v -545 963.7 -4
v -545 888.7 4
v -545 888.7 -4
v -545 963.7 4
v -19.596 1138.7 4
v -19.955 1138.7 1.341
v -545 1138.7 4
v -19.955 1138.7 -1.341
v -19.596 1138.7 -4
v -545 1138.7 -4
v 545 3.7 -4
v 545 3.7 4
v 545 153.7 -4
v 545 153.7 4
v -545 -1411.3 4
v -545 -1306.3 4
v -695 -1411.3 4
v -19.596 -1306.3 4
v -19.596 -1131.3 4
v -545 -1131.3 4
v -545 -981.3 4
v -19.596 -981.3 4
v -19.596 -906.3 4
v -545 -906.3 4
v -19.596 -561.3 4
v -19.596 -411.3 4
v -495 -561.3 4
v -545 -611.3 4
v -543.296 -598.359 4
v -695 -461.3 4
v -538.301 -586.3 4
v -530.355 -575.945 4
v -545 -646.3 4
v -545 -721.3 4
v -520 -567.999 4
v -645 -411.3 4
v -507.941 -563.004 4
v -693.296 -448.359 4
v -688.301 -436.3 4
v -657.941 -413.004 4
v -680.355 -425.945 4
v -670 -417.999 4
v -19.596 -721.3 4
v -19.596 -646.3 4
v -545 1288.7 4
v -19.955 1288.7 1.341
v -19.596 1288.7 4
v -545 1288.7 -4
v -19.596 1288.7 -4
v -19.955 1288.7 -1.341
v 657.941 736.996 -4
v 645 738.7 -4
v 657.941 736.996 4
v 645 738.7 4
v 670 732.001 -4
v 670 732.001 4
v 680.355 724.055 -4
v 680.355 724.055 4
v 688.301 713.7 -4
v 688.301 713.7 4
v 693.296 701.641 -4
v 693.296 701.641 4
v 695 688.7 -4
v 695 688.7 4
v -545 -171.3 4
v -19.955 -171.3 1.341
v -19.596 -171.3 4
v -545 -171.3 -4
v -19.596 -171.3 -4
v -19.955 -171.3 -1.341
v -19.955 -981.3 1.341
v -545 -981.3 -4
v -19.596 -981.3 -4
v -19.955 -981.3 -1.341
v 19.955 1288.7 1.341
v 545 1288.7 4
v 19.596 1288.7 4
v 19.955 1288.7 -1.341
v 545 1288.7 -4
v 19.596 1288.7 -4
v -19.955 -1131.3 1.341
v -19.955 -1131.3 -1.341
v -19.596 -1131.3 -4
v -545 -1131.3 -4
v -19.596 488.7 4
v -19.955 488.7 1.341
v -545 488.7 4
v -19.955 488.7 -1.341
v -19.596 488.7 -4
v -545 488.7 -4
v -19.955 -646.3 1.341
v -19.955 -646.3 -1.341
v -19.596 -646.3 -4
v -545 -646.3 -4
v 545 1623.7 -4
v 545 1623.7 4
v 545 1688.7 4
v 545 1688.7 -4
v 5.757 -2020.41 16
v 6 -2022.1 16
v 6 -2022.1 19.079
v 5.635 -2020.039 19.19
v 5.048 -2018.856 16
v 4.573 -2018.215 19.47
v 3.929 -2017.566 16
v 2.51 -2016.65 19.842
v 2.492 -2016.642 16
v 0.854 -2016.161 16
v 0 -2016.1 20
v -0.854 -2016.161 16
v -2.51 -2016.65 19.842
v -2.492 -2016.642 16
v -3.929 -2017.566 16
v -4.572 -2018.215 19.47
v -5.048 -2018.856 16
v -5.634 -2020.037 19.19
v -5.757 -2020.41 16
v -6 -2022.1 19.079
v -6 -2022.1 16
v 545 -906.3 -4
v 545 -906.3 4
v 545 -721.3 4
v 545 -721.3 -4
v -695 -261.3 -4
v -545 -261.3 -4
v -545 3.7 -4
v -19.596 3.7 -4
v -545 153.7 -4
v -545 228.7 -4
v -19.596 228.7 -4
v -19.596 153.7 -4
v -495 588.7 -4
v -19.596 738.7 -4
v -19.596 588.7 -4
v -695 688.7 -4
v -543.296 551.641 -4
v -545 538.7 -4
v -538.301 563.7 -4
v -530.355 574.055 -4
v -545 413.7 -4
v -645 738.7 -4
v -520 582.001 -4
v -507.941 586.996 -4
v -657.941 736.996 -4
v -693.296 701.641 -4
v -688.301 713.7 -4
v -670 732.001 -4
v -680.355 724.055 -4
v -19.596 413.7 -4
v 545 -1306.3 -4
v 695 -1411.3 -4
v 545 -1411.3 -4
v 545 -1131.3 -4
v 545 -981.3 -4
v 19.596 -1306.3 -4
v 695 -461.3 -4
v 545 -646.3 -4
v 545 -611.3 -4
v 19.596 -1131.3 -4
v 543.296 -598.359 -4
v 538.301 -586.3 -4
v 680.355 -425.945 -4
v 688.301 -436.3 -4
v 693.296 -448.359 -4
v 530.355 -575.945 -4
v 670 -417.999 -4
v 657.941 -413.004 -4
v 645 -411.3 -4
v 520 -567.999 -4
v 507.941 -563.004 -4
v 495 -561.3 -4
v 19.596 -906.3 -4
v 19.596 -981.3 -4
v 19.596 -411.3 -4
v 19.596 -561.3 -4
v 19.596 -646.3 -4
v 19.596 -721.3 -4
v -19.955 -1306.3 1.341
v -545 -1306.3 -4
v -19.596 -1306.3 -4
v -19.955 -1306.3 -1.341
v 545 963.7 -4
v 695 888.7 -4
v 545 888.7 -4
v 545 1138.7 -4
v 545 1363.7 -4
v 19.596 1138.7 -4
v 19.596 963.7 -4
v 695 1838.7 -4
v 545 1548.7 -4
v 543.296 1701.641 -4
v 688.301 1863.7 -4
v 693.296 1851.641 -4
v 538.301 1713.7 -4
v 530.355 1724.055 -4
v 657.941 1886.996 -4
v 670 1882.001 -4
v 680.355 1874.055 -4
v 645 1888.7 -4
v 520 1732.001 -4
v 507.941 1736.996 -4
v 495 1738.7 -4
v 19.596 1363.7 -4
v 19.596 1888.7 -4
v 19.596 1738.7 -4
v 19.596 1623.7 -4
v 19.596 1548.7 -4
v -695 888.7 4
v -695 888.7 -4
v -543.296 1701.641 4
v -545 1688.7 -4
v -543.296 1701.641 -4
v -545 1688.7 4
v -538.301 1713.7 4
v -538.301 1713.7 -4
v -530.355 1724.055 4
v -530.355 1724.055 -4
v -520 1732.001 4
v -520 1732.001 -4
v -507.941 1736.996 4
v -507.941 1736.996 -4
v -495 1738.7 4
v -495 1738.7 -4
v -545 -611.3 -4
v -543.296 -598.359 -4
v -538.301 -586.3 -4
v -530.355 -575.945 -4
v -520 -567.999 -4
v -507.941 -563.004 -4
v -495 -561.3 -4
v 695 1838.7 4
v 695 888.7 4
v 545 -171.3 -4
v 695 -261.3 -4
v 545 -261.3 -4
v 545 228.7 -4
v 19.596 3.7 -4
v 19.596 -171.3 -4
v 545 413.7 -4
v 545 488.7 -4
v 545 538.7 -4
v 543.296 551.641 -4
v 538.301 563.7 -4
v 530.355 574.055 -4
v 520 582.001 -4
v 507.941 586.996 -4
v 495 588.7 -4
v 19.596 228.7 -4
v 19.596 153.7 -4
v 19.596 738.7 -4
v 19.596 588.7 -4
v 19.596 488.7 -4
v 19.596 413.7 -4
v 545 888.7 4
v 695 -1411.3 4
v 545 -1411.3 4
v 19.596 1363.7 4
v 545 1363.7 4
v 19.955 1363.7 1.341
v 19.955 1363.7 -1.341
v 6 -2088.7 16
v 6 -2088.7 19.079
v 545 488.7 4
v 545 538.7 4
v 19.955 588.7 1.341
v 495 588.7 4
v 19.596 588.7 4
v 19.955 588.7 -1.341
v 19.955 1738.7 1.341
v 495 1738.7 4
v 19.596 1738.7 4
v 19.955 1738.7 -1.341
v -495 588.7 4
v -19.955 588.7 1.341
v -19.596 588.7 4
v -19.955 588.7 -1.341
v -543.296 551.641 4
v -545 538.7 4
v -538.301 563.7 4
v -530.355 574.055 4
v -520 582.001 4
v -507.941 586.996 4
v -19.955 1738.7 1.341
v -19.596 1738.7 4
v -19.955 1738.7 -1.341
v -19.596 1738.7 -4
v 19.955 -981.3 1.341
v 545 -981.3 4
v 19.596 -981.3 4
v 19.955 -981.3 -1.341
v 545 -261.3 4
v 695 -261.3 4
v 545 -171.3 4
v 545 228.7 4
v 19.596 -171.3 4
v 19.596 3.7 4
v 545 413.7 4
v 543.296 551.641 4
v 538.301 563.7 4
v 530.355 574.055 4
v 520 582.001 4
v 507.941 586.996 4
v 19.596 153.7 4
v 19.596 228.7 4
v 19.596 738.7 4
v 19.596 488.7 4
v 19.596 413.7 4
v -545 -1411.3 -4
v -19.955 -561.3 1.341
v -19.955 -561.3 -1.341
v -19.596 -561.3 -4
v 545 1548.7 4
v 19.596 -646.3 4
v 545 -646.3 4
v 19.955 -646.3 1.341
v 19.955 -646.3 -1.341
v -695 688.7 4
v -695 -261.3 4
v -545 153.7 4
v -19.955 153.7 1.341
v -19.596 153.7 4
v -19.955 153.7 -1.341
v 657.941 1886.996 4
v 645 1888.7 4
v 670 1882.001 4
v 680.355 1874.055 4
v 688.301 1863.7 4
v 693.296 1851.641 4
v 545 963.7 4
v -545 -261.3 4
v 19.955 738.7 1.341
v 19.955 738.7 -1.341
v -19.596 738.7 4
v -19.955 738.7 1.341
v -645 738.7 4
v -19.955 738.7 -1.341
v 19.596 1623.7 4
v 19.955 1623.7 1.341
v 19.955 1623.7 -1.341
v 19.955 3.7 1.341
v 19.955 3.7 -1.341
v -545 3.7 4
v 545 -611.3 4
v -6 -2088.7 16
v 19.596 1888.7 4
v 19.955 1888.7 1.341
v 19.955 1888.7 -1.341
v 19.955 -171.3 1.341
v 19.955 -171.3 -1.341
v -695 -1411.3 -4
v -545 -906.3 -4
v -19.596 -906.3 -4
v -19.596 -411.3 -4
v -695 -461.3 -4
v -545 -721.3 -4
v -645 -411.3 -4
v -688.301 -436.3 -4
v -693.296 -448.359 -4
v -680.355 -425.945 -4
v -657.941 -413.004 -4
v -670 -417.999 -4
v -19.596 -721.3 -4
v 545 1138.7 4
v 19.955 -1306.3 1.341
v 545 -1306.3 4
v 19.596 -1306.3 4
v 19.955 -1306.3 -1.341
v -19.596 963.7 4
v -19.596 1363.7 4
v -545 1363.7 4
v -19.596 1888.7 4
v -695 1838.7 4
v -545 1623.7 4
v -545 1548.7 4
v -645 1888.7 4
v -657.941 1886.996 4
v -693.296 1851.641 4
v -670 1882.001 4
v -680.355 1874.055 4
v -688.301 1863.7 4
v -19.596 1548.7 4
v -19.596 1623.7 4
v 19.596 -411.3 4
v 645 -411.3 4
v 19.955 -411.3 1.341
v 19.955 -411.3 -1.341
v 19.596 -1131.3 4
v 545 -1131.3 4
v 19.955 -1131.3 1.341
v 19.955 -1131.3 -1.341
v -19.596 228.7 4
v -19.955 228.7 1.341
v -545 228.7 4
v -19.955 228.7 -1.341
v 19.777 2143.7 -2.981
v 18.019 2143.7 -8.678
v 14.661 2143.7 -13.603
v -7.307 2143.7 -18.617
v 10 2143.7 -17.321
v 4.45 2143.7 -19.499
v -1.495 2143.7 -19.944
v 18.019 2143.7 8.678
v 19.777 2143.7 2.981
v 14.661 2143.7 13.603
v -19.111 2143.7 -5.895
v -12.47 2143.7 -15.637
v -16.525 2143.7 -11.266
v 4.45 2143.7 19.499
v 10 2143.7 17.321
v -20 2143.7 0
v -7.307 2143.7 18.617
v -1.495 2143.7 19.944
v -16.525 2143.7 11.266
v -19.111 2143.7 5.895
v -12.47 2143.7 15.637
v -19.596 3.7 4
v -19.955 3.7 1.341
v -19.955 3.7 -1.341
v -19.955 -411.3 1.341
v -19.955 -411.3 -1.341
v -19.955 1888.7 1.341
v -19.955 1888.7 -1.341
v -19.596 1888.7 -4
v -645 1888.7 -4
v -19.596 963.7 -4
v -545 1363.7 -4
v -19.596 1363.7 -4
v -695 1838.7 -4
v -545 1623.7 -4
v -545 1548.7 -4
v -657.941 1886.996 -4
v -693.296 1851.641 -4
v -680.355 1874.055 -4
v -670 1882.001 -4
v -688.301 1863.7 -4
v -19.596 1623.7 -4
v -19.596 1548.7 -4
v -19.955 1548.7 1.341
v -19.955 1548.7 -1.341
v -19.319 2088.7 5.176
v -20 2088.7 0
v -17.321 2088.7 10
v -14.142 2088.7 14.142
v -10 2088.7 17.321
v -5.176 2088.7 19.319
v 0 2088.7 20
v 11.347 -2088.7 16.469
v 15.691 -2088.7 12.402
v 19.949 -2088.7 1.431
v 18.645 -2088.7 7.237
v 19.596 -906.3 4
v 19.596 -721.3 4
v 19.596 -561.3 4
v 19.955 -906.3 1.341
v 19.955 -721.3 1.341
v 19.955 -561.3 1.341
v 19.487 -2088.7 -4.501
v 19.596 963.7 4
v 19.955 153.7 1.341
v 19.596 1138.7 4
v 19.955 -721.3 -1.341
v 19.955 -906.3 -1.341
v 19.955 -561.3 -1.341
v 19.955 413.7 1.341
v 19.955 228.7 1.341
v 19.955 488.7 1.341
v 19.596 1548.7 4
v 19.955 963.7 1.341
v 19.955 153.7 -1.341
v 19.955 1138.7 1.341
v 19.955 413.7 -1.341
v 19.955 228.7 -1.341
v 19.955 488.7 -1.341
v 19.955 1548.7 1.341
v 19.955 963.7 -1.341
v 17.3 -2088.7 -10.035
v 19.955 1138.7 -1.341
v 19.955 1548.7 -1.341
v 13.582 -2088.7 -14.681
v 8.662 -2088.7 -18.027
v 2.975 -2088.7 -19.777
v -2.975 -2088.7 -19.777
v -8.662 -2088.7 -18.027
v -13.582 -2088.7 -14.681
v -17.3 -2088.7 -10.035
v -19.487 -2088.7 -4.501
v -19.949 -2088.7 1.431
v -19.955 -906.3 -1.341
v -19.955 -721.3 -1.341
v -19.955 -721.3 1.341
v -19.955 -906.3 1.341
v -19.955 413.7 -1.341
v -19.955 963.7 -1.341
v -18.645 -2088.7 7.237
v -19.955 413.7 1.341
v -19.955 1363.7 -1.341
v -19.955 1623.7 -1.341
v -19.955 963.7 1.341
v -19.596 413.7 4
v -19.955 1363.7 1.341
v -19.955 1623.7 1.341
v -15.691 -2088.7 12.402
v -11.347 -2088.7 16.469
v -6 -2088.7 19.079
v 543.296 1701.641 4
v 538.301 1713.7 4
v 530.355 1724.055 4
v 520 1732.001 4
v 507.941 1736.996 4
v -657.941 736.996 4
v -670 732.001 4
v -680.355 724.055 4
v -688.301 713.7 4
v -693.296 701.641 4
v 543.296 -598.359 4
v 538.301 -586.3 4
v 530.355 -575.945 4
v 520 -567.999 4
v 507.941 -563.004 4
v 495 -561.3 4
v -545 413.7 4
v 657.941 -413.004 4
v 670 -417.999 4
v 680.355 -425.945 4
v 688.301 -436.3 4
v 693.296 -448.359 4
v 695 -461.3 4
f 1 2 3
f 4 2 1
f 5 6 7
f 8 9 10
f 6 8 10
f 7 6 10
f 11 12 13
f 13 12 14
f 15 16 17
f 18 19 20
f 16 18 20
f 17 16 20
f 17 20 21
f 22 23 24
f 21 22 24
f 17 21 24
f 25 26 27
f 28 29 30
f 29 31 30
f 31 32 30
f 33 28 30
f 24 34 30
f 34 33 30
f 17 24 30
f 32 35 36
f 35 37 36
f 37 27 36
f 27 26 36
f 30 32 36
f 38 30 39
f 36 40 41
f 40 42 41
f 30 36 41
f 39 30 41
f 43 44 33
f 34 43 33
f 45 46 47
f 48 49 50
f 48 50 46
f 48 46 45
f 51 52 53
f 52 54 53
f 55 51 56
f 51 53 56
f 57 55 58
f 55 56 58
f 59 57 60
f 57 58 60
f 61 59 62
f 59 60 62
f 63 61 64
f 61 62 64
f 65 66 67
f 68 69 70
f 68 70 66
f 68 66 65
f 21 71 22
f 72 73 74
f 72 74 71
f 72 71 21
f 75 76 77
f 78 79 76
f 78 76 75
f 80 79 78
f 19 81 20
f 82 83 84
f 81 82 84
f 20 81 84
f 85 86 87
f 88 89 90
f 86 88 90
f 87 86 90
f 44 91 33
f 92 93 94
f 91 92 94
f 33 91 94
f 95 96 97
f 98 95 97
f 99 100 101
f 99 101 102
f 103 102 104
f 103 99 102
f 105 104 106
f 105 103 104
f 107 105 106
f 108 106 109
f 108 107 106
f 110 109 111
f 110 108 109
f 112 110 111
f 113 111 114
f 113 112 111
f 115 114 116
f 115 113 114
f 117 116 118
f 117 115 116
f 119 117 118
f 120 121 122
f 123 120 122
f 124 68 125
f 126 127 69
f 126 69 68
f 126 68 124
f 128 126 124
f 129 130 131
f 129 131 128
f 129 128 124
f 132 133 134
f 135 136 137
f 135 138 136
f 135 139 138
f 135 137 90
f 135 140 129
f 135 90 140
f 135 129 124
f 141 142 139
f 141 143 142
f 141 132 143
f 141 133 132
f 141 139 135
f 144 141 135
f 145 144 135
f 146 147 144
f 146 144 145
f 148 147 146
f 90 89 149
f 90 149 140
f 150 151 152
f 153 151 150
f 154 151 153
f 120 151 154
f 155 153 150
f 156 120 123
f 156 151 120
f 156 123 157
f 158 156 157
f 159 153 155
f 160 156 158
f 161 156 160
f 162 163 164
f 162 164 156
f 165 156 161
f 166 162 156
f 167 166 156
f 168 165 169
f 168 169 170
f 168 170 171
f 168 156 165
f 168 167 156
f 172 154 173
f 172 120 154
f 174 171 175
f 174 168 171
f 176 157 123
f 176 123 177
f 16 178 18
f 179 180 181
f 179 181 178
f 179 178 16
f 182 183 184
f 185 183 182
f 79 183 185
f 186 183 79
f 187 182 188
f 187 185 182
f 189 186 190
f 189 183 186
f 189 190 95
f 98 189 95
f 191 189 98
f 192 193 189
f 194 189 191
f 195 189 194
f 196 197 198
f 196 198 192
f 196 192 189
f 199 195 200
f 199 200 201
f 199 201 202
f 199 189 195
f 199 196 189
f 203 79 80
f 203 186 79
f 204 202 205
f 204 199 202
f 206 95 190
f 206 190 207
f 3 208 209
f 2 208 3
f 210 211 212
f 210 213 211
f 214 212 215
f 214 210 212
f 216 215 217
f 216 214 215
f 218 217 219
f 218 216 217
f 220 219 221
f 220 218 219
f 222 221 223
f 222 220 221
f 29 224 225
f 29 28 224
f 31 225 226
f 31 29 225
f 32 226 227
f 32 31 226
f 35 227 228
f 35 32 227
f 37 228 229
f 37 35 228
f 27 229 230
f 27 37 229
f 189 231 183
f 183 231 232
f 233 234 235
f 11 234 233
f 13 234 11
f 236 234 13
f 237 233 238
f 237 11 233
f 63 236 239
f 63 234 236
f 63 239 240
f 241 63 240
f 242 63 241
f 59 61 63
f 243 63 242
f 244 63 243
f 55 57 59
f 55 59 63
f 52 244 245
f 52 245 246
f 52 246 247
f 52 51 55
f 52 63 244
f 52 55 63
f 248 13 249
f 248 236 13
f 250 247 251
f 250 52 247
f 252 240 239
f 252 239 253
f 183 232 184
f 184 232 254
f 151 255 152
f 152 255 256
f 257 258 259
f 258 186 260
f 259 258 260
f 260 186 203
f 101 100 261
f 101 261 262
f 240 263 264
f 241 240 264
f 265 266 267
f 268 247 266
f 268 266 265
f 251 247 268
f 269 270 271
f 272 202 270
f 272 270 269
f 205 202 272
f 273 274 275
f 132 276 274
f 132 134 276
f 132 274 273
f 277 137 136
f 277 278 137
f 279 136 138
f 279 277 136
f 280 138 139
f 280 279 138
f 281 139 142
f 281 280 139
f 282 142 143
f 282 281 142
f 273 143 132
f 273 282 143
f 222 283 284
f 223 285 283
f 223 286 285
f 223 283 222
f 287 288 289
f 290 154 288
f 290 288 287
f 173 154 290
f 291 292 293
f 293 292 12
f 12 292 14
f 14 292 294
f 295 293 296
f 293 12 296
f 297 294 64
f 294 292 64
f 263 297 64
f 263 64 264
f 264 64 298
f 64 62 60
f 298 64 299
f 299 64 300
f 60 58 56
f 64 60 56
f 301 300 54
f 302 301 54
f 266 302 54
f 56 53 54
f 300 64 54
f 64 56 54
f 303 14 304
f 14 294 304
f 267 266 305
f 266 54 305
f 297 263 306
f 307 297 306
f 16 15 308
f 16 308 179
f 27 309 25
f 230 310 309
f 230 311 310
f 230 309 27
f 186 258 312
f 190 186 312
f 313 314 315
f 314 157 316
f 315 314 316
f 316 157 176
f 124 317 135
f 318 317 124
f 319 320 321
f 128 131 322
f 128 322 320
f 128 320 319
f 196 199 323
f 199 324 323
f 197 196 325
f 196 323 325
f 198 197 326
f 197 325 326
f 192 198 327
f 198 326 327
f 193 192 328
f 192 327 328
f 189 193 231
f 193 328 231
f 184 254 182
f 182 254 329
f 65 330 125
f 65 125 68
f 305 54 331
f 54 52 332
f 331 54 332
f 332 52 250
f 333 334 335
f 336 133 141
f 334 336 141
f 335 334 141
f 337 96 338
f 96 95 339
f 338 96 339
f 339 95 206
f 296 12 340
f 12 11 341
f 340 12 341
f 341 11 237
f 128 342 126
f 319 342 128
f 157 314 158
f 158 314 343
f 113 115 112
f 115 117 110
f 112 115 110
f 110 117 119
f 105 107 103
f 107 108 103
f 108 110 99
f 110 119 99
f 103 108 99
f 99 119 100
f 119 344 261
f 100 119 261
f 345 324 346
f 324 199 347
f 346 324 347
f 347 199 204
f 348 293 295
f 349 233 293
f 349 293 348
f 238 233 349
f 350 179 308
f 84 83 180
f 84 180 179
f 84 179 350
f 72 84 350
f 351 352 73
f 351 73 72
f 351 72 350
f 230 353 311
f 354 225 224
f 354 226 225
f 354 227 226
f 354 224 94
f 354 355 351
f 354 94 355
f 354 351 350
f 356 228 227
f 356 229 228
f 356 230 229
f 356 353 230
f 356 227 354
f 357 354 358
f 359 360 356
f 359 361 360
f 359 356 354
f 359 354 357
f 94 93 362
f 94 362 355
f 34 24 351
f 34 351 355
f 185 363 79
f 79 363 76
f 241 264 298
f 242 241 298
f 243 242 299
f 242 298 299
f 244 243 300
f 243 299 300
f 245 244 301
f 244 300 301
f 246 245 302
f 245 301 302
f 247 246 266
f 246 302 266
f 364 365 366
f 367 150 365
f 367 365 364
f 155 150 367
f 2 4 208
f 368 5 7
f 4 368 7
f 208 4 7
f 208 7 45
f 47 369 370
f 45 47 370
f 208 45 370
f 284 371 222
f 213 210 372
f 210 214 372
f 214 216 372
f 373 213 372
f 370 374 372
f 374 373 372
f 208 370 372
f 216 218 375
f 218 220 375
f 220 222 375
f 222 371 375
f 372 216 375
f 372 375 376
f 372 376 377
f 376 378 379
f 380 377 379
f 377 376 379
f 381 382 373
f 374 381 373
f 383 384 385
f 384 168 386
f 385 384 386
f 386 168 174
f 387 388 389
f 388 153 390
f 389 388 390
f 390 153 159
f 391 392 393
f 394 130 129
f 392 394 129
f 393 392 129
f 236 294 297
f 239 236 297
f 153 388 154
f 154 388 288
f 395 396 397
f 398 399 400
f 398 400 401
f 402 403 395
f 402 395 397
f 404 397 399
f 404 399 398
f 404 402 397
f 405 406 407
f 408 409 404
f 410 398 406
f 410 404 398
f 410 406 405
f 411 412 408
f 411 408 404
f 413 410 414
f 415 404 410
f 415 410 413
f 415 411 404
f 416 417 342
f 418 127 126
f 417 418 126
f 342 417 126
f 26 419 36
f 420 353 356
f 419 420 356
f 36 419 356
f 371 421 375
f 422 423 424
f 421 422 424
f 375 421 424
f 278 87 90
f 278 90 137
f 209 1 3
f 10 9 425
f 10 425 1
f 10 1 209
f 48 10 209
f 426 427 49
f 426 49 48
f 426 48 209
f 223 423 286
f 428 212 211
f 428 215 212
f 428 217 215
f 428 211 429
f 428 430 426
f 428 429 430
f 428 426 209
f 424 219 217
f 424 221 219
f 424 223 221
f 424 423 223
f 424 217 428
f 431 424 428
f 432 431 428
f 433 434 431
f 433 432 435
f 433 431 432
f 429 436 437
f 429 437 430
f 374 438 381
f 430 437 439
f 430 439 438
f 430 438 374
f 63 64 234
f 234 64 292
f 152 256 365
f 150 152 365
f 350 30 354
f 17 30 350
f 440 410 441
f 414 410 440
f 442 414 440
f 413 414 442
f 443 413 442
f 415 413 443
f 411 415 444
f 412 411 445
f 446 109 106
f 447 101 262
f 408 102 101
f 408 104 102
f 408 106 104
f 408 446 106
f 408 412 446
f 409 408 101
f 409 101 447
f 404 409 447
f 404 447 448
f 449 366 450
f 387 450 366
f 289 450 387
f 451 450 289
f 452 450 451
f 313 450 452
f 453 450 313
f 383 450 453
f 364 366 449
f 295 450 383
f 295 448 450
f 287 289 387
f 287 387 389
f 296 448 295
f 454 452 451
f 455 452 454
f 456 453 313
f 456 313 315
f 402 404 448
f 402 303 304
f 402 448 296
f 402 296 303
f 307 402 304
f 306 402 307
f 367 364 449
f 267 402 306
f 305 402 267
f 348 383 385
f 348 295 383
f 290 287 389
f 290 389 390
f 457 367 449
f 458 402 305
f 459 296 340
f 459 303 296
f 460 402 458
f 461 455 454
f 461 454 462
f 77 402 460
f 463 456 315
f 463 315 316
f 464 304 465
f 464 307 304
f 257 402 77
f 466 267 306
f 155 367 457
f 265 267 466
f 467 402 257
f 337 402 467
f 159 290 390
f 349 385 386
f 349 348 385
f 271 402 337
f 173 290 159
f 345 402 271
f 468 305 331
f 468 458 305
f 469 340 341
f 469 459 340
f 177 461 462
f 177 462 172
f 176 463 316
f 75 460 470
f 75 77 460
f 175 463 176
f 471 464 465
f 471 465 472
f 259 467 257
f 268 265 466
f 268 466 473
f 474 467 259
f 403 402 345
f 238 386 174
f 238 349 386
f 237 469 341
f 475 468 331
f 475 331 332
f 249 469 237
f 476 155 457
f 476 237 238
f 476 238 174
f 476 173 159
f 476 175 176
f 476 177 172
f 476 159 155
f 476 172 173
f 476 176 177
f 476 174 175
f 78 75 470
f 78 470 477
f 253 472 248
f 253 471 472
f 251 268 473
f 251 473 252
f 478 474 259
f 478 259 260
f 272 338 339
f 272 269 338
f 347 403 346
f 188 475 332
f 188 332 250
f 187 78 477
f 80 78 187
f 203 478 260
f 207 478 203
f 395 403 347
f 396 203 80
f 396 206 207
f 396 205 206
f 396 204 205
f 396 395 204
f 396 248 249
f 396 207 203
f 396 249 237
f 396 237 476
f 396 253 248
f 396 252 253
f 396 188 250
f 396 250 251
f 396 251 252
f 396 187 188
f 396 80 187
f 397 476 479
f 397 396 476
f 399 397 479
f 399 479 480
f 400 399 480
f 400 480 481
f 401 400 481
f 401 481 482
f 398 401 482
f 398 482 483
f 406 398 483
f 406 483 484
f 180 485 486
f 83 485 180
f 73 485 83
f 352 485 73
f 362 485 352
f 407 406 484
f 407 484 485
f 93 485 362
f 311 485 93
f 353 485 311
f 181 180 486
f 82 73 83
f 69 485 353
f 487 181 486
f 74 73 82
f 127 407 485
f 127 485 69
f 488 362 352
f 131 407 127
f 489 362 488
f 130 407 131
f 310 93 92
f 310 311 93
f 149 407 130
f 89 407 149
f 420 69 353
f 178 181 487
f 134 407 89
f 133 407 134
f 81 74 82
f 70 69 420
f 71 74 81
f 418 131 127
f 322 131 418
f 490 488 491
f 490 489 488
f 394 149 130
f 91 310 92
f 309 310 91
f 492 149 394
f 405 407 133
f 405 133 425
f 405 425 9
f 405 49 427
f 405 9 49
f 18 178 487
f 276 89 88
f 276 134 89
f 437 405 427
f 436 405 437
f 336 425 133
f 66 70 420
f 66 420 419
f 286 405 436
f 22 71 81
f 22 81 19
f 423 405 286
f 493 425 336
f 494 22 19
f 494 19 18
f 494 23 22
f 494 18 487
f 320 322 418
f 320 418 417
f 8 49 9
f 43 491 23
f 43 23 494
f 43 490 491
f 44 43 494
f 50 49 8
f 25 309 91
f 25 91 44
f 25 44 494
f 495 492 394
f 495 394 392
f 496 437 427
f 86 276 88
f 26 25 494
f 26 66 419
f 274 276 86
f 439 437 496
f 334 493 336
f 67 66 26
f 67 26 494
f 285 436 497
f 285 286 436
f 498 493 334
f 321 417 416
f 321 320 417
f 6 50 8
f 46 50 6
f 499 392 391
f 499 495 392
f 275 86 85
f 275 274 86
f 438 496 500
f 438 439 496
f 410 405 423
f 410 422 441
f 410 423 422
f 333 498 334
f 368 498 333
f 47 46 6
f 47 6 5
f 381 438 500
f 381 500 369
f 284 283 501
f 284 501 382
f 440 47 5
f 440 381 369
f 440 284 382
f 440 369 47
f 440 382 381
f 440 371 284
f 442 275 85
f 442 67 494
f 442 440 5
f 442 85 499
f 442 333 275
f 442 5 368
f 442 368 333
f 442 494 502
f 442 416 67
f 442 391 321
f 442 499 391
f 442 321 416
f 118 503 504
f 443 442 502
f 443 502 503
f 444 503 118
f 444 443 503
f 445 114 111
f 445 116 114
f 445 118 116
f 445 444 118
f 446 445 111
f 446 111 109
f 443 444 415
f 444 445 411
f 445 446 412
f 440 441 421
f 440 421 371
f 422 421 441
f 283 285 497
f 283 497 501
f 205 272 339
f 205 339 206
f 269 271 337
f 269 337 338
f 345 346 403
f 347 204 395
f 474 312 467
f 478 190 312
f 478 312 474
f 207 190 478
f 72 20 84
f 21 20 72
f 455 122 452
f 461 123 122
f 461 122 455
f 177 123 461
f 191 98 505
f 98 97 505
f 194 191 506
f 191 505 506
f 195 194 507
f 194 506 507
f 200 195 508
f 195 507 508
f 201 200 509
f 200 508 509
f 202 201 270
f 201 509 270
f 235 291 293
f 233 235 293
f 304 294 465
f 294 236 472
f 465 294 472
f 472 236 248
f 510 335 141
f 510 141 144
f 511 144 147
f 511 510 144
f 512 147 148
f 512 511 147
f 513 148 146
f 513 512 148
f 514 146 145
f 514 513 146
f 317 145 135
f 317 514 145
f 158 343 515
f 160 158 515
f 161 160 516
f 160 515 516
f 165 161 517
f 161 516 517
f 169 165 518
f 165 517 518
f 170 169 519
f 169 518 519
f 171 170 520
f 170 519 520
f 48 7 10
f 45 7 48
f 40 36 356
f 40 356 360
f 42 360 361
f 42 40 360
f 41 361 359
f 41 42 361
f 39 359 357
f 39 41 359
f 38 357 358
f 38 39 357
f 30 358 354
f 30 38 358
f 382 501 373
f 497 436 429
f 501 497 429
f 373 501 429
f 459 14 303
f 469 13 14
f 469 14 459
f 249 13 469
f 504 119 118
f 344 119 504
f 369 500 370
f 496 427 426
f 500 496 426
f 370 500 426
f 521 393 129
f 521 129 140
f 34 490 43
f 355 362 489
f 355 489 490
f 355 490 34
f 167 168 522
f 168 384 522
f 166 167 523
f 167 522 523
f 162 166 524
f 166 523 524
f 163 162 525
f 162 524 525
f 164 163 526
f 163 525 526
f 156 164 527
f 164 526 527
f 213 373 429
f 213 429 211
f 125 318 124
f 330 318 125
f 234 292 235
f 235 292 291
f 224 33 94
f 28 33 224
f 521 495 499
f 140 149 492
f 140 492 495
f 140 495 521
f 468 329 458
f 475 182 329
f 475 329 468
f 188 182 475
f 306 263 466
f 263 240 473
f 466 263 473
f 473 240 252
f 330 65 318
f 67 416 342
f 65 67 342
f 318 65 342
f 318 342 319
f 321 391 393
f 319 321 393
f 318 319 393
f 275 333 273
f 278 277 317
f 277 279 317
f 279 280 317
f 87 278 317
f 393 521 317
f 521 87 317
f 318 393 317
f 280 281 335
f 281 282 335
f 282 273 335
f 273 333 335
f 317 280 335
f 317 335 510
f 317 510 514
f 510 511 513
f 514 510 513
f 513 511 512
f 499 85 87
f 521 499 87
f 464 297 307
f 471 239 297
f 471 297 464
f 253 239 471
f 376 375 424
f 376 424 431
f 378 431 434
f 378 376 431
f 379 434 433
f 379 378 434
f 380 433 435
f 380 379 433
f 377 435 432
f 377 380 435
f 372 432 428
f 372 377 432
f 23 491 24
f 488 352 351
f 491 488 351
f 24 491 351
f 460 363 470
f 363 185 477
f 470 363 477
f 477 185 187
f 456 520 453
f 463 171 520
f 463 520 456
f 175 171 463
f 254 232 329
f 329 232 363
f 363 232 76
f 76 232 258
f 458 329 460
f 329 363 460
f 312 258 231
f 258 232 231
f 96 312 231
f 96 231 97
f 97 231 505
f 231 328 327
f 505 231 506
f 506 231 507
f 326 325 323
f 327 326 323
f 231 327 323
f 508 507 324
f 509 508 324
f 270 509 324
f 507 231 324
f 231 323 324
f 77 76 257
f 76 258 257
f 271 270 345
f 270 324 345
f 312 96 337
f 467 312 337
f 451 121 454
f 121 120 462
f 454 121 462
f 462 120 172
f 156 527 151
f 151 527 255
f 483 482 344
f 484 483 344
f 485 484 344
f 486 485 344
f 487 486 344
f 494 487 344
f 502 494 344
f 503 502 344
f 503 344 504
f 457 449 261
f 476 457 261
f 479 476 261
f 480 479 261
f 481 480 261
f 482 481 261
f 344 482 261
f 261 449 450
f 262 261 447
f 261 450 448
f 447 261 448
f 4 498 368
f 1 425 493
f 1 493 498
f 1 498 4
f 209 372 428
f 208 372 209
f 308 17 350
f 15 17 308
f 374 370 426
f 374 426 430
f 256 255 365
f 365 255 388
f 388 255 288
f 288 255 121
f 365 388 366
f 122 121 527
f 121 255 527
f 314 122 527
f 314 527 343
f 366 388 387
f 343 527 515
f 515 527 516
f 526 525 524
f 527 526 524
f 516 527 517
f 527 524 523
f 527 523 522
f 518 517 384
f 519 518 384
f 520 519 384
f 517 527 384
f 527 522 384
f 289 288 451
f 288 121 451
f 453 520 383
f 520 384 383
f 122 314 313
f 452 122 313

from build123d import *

# Parameters (mm, degrees)
IZIM1_R                       = 20
Y_KSEKLIK_EKSTR_ZYON1_DEPTH   = 2088.7
IZIM2_W                       = 12
IZIM2_H                       = 8
KES_EKSTR_ZYON1_DEPTH         = 64.2
KES_EKSTR_ZYON4_DEPTH         = 3.08
KES_EKSTR_ZYON4_DEPTH_BACK    = 3.08
Y_KSEKLIK_EKSTR_ZYON2_DEPTH   = 4
Y_KSEKLIK_EKSTR_ZYON2_2_DEPTH = 4
Y_KSEKLIK_EKSTR_ZYON2_3_DEPTH = 4
Y_KSEKLIK_EKSTR_ZYON2_4_DEPTH = 4
Y_KSEKLIK_EKSTR_ZYON2_5_DEPTH = 4
Y_KSEKLIK_EKSTR_ZYON2_6_DEPTH = 4
IZIM5_W                       = 40
IZIM5_H                       = 150
Y_KSEKLIK_EKSTR_ZYON3_DEPTH   = 8
IZIM6_W                       = 1090
IZIM6_H                       = 75
IZIM6_H_2                     = 175
Y_KSEKLIK_EKSTR_ZYON4_DEPTH   = 8
Y_KSEKLIK_EKSTR_ZYON5_START   = 55
IZIM7_R                       = 20
Y_KSEKLIK_EKSTR_ZYON5_DEPTH   = 55


with BuildPart() as part:
    # Çizim1 → Yükseklik-Ekstrüzyon1 (new, symmetric)
    with BuildSketch(Plane(origin=(0, 0, 0), x_dir=(1, 0, 0), z_dir=(0, 1, 0))):
        Circle(IZIM1_R)
    extrude(amount=Y_KSEKLIK_EKSTR_ZYON1_DEPTH, both=True)

    # Çizim2 → Kes-Ekstrüzyon1 (cut)
    with BuildSketch(Plane.XZ.offset(2088.7)):
        with Locations((0, 20)):
            Rectangle(IZIM2_W, IZIM2_H)
    extrude(amount=-KES_EKSTR_ZYON1_DEPTH, mode=Mode.SUBTRACT)

    # Çizim3 → Kes-Ekstrüzyon4 (cut, two sides: drawn at the far end of the back side and taken through both)
    with BuildSketch(Plane.XY.offset(19.08).offset(-KES_EKSTR_ZYON4_DEPTH_BACK)):
        with BuildLine():
            Line((6, -2024.5), (6, -2022.1))
            ThreePointArc((6, -2022.1), (0, -2016.1), (-6, -2022.1))
            Line((-6, -2022.1), (-6, -2024.5))
            Line((-6, -2024.5), (6, -2024.5))
        make_face()
    extrude(amount=KES_EKSTR_ZYON4_DEPTH + KES_EKSTR_ZYON4_DEPTH_BACK, mode=Mode.SUBTRACT)



with BuildPart() as body_2:
    # Çizim4 → Yükseklik-Ekstrüzyon2 (new, symmetric)
    with BuildSketch(Plane.XY):
        with BuildLine():
            Line((20, 1888.7), (645, 1888.7))
            ThreePointArc((645, 1888.7), (680.355339059, 1874.055339059), (695, 1838.7))
            Line((695, 1838.7), (695, 888.7))
            Line((695, 888.7), (545, 888.7))
            Line((545, 888.7), (545, 1688.7))
            ThreePointArc((545, 1688.7), (530.355339059, 1724.055339059), (495, 1738.7))
            Line((495, 1738.7), (20, 1738.7))
            Line((20, 1738.7), (20, 1888.7))
        make_face()
    extrude(amount=Y_KSEKLIK_EKSTR_ZYON2_DEPTH, both=True)


with BuildPart() as body_3:
    # Çizim4 → Y_kseklik-Ekstr_zyon2 2 (new, symmetric)
    with BuildSketch(Plane.XY):
        with BuildLine():
            Line((-495, 1738.7), (-20, 1738.7))
            Line((-20, 1738.7), (-20, 1888.7))
            Line((-20, 1888.7), (-645, 1888.7))
            ThreePointArc((-645, 1888.7), (-680.355339059, 1874.055339059), (-695, 1838.7))
            Line((-695, 1838.7), (-695, 888.7))
            Line((-695, 888.7), (-545, 888.7))
            Line((-545, 888.7), (-545, 1688.7))
            ThreePointArc((-545, 1688.7), (-530.355339059, 1724.055339059), (-495, 1738.7))
        make_face()
    extrude(amount=Y_KSEKLIK_EKSTR_ZYON2_2_DEPTH, both=True)


with BuildPart() as body_4:
    # Çizim4 → Y_kseklik-Ekstr_zyon2 3 (new, symmetric)
    with BuildSketch(Plane.XY):
        with BuildLine():
            Line((20, 588.7), (20, 738.7))
            Line((20, 738.7), (645, 738.7))
            ThreePointArc((645, 738.7), (680.355339059, 724.055339059), (695, 688.7))
            Line((695, 688.7), (695, -261.3))
            Line((695, -261.3), (545, -261.3))
            Line((545, -261.3), (545, 538.7))
            ThreePointArc((545, 538.7), (530.355339059, 574.055339059), (495, 588.7))
            Line((495, 588.7), (20, 588.7))
        make_face()
    extrude(amount=Y_KSEKLIK_EKSTR_ZYON2_3_DEPTH, both=True)


with BuildPart() as body_5:
    # Çizim4 → Y_kseklik-Ekstr_zyon2 4 (new, symmetric)
    with BuildSketch(Plane.XY):
        with BuildLine():
            Line((-495, 588.7), (-20, 588.7))
            Line((-20, 588.7), (-20, 738.7))
            Line((-20, 738.7), (-645, 738.7))
            ThreePointArc((-645, 738.7), (-680.355339059, 724.055339059), (-695, 688.7))
            Line((-695, 688.7), (-695, -261.3))
            Line((-695, -261.3), (-545, -261.3))
            Line((-545, -261.3), (-545, 538.7))
            ThreePointArc((-545, 538.7), (-530.355339059, 574.055339059), (-495, 588.7))
        make_face()
    extrude(amount=Y_KSEKLIK_EKSTR_ZYON2_4_DEPTH, both=True)


with BuildPart() as body_6:
    # Çizim4 → Y_kseklik-Ekstr_zyon2 5 (new, symmetric)
    with BuildSketch(Plane.XY):
        with BuildLine():
            Line((20, -561.3), (20, -411.3))
            Line((20, -411.3), (645, -411.3))
            ThreePointArc((645, -411.3), (680.355339059, -425.944660941), (695, -461.3))
            Line((695, -461.3), (695, -1411.3))
            Line((695, -1411.3), (545, -1411.3))
            Line((545, -1411.3), (545, -611.3))
            ThreePointArc((545, -611.3), (530.355339059, -575.944660941), (495, -561.3))
            Line((495, -561.3), (20, -561.3))
        make_face()
    extrude(amount=Y_KSEKLIK_EKSTR_ZYON2_5_DEPTH, both=True)


with BuildPart() as body_7:
    # Çizim4 → Y_kseklik-Ekstr_zyon2 6 (new, symmetric)
    with BuildSketch(Plane.XY):
        with BuildLine():
            Line((-495, -561.3), (-20, -561.3))
            Line((-20, -561.3), (-20, -411.3))
            Line((-20, -411.3), (-645, -411.3))
            ThreePointArc((-645, -411.3), (-680.355339059, -425.944660941), (-695, -461.3))
            Line((-695, -461.3), (-695, -1411.3))
            Line((-695, -1411.3), (-545, -1411.3))
            Line((-545, -1411.3), (-545, -611.3))
            ThreePointArc((-545, -611.3), (-530.355339059, -575.944660941), (-495, -561.3))
        make_face()
    extrude(amount=Y_KSEKLIK_EKSTR_ZYON2_6_DEPTH, both=True)


with BuildPart() as part_1:
    add(part.part)

    add(body_2.part)  # Yükseklik-Ekstrüzyon3 merges body 2

    add(body_3.part)  # Yükseklik-Ekstrüzyon3 merges body 3

    add(body_4.part)  # Yükseklik-Ekstrüzyon3 merges body 4

    add(body_5.part)  # Yükseklik-Ekstrüzyon3 merges body 5

    add(body_6.part)  # Yükseklik-Ekstrüzyon3 merges body 6

    add(body_7.part)  # Yükseklik-Ekstrüzyon3 merges body 7
    # Çizim5 → Yükseklik-Ekstrüzyon3 (add)
    with BuildSketch(Plane(origin=(0, 0, -4), x_dir=(-1, 0, 0), z_dir=(0, 0, -1))):
        with Locations((0, -486.3)):
            Rectangle(IZIM5_W, IZIM5_H)
        with Locations((0, 663.7)):
            Rectangle(IZIM5_W, IZIM5_H)
        with Locations((0, 1813.7)):
            Rectangle(IZIM5_W, IZIM5_H)
    extrude(amount=-Y_KSEKLIK_EKSTR_ZYON3_DEPTH)

    # Çizim6 → Yükseklik-Ekstrüzyon4 (add)
    with BuildSketch(Plane(origin=(0, 0, -4), x_dir=(-1, 0, 0), z_dir=(0, 0, -1))):
        with Locations((0, 451.2)):
            Rectangle(IZIM6_W, IZIM6_H)
        with Locations((0, 191.2)):
            Rectangle(IZIM6_W, IZIM6_H)
        with Locations((0, -83.8)):
            Rectangle(IZIM6_W, IZIM6_H_2)
        with Locations((0, 1051.2)):
            Rectangle(IZIM6_W, IZIM6_H_2)
        with Locations((0, 1326.2)):
            Rectangle(IZIM6_W, IZIM6_H)
        with Locations((0, 1586.2)):
            Rectangle(IZIM6_W, IZIM6_H)
        with Locations((0, -1218.8)):
            Rectangle(IZIM6_W, IZIM6_H_2)
        with Locations((0, -943.8)):
            Rectangle(IZIM6_W, IZIM6_H)
        with Locations((0, -683.8)):
            Rectangle(IZIM6_W, IZIM6_H)
    extrude(amount=-Y_KSEKLIK_EKSTR_ZYON4_DEPTH)

    # Çizim7 → Yükseklik-Ekstrüzyon5 (add)
    with BuildSketch(Plane(origin=(0, 2088.7, 0), x_dir=(1, 0, 0), z_dir=(0, 1, 0)).offset(Y_KSEKLIK_EKSTR_ZYON5_START)):
        Circle(IZIM7_R)
    extrude(amount=-Y_KSEKLIK_EKSTR_ZYON5_DEPTH)


solid = part_1.part
